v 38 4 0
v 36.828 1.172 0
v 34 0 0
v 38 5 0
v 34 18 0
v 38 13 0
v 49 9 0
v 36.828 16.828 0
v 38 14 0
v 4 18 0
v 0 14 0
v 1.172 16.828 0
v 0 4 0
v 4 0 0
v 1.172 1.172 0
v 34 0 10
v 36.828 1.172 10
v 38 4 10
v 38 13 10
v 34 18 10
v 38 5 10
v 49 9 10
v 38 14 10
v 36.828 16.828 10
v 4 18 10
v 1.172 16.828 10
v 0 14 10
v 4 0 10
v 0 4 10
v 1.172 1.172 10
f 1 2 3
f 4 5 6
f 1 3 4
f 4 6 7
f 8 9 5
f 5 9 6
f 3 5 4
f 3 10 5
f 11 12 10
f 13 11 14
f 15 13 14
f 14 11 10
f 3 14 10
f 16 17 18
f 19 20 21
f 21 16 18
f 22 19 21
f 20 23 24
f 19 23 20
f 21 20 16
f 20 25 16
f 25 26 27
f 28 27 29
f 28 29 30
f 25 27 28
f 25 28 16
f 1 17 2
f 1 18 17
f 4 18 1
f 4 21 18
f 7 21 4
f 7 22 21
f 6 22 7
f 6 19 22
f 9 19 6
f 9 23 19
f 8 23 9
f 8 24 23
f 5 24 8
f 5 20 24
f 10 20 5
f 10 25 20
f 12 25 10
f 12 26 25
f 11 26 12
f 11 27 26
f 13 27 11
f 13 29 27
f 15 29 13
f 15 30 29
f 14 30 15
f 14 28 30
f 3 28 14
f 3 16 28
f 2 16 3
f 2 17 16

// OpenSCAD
$fn = 32;

// ----------------------------------------------------------------------
// Ratchet pawl: 38 x 18 mm body, beak 11 mm с правого торца
// ----------------------------------------------------------------------

// --- parameters (mm) ---
profile_height = 10;      // extrusion height
profile_points = 15;      // points of the closed outline

profile = [[0, 4], [1.172, 1.172], [4, 0], [34, 0], [36.828, 1.172], [38, 4], [38, 5], [49, 9], [38, 13], [38, 14], [36.828, 16.828], [34, 18], [4, 18], [1.172, 16.828], [0, 14]];  // single closed polygon, 15 points, counter clockwise

// --- the one profile operation ---
linear_extrude(height = profile_height) polygon(points = profile);
